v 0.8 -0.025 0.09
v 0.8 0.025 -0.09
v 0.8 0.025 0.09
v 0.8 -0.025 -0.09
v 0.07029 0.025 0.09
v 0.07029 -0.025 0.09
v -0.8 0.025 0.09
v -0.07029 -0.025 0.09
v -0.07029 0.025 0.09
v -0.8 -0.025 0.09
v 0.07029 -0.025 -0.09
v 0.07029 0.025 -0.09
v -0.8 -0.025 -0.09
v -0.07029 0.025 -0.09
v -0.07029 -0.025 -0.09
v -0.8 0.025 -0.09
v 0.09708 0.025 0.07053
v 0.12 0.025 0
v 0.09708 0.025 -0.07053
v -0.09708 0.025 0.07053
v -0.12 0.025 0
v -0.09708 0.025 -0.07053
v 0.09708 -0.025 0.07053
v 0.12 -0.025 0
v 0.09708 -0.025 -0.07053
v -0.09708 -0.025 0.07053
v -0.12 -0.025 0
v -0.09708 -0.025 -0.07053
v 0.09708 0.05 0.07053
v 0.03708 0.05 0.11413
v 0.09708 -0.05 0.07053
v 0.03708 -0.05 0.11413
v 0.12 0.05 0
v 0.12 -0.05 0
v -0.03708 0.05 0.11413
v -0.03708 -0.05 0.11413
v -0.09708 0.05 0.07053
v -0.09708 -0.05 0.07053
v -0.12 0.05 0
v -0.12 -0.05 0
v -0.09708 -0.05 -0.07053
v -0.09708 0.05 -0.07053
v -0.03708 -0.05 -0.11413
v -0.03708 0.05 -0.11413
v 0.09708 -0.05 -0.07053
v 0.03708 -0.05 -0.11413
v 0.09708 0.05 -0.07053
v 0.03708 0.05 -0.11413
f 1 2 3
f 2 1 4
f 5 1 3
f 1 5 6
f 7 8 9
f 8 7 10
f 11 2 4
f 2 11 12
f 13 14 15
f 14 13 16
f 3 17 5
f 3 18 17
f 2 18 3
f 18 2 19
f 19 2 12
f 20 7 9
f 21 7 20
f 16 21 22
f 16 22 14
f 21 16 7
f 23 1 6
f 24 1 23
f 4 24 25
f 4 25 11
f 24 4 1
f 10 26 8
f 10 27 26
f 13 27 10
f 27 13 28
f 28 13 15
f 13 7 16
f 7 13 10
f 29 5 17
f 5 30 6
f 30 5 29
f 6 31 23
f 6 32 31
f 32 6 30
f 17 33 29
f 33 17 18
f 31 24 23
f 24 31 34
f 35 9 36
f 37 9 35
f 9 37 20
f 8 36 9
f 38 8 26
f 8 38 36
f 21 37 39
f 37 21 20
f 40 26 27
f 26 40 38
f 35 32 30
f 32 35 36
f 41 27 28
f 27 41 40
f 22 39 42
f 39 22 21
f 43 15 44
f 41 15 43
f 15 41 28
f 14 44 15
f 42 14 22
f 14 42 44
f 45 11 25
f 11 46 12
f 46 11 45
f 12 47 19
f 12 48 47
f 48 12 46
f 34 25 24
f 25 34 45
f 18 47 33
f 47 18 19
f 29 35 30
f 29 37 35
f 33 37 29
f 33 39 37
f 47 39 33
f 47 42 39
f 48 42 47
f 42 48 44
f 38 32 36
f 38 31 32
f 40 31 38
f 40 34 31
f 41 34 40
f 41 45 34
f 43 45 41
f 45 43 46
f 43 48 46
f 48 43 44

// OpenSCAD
// Helicopter tail rotor — 2-blade assembly. Rendered as a separate animated
// part that spins around the game-Z axis (= SCAD Y = tail-boom shaft axis).
// Origin is at the rotor hub centre so the renderer can spin all vertices
// around (0,0,0).
//
// Keep dimensions in sync with helicopter_body.scad.

$fn = 10;

body_z    = 0.65;
body_h    = 2.0;
body_cx   = 0.8;
body_l    = 4.5;
body_rear = body_cx - body_l / 2;
boom_l    = 5.0;
boom_end_x = body_rear - boom_l;
boom_rise = 0.50;
body_top  = body_z + body_h;
boom_z_fwd = body_z + body_h * 0.38;
boom_z_end = boom_z_fwd + boom_rise;

fin_h   = 1.10;
fin_l   = 0.85;
fin_thk = 0.12;

tr_l = 0.80;
tr_w = 0.18;
tr_h = 0.05;
n_tr = 2;

// Hub position in SCAD space (matches helicopter_body.scad)
tr_x = boom_end_x + fin_l * 0.50;
tr_y = fin_thk / 2 + 0.06;
tr_z = boom_z_end + fin_h * 0.65;

// Translate so hub centre (tr_x, tr_y, tr_z) sits at origin.
translate([-tr_x, -tr_y, -tr_z]) {
    // Hub disc — axis along Y (shaft direction)
    color([0.32, 0.32, 0.35])
    translate([tr_x, tr_y, tr_z])
        rotate([90, 0, 0])
            cylinder(h = 0.10, r = 0.12, center = true);

    // Two blades, 180° apart, extending along X from hub centre
    color([0.12, 0.12, 0.14])
    for (i = [0 : n_tr - 1])
        translate([tr_x, tr_y, tr_z])
            rotate([0, i * 360 / n_tr, 0])
                translate([tr_l / 2, 0, 0])
                    cube([tr_l, tr_h, tr_w], center = true);
}
